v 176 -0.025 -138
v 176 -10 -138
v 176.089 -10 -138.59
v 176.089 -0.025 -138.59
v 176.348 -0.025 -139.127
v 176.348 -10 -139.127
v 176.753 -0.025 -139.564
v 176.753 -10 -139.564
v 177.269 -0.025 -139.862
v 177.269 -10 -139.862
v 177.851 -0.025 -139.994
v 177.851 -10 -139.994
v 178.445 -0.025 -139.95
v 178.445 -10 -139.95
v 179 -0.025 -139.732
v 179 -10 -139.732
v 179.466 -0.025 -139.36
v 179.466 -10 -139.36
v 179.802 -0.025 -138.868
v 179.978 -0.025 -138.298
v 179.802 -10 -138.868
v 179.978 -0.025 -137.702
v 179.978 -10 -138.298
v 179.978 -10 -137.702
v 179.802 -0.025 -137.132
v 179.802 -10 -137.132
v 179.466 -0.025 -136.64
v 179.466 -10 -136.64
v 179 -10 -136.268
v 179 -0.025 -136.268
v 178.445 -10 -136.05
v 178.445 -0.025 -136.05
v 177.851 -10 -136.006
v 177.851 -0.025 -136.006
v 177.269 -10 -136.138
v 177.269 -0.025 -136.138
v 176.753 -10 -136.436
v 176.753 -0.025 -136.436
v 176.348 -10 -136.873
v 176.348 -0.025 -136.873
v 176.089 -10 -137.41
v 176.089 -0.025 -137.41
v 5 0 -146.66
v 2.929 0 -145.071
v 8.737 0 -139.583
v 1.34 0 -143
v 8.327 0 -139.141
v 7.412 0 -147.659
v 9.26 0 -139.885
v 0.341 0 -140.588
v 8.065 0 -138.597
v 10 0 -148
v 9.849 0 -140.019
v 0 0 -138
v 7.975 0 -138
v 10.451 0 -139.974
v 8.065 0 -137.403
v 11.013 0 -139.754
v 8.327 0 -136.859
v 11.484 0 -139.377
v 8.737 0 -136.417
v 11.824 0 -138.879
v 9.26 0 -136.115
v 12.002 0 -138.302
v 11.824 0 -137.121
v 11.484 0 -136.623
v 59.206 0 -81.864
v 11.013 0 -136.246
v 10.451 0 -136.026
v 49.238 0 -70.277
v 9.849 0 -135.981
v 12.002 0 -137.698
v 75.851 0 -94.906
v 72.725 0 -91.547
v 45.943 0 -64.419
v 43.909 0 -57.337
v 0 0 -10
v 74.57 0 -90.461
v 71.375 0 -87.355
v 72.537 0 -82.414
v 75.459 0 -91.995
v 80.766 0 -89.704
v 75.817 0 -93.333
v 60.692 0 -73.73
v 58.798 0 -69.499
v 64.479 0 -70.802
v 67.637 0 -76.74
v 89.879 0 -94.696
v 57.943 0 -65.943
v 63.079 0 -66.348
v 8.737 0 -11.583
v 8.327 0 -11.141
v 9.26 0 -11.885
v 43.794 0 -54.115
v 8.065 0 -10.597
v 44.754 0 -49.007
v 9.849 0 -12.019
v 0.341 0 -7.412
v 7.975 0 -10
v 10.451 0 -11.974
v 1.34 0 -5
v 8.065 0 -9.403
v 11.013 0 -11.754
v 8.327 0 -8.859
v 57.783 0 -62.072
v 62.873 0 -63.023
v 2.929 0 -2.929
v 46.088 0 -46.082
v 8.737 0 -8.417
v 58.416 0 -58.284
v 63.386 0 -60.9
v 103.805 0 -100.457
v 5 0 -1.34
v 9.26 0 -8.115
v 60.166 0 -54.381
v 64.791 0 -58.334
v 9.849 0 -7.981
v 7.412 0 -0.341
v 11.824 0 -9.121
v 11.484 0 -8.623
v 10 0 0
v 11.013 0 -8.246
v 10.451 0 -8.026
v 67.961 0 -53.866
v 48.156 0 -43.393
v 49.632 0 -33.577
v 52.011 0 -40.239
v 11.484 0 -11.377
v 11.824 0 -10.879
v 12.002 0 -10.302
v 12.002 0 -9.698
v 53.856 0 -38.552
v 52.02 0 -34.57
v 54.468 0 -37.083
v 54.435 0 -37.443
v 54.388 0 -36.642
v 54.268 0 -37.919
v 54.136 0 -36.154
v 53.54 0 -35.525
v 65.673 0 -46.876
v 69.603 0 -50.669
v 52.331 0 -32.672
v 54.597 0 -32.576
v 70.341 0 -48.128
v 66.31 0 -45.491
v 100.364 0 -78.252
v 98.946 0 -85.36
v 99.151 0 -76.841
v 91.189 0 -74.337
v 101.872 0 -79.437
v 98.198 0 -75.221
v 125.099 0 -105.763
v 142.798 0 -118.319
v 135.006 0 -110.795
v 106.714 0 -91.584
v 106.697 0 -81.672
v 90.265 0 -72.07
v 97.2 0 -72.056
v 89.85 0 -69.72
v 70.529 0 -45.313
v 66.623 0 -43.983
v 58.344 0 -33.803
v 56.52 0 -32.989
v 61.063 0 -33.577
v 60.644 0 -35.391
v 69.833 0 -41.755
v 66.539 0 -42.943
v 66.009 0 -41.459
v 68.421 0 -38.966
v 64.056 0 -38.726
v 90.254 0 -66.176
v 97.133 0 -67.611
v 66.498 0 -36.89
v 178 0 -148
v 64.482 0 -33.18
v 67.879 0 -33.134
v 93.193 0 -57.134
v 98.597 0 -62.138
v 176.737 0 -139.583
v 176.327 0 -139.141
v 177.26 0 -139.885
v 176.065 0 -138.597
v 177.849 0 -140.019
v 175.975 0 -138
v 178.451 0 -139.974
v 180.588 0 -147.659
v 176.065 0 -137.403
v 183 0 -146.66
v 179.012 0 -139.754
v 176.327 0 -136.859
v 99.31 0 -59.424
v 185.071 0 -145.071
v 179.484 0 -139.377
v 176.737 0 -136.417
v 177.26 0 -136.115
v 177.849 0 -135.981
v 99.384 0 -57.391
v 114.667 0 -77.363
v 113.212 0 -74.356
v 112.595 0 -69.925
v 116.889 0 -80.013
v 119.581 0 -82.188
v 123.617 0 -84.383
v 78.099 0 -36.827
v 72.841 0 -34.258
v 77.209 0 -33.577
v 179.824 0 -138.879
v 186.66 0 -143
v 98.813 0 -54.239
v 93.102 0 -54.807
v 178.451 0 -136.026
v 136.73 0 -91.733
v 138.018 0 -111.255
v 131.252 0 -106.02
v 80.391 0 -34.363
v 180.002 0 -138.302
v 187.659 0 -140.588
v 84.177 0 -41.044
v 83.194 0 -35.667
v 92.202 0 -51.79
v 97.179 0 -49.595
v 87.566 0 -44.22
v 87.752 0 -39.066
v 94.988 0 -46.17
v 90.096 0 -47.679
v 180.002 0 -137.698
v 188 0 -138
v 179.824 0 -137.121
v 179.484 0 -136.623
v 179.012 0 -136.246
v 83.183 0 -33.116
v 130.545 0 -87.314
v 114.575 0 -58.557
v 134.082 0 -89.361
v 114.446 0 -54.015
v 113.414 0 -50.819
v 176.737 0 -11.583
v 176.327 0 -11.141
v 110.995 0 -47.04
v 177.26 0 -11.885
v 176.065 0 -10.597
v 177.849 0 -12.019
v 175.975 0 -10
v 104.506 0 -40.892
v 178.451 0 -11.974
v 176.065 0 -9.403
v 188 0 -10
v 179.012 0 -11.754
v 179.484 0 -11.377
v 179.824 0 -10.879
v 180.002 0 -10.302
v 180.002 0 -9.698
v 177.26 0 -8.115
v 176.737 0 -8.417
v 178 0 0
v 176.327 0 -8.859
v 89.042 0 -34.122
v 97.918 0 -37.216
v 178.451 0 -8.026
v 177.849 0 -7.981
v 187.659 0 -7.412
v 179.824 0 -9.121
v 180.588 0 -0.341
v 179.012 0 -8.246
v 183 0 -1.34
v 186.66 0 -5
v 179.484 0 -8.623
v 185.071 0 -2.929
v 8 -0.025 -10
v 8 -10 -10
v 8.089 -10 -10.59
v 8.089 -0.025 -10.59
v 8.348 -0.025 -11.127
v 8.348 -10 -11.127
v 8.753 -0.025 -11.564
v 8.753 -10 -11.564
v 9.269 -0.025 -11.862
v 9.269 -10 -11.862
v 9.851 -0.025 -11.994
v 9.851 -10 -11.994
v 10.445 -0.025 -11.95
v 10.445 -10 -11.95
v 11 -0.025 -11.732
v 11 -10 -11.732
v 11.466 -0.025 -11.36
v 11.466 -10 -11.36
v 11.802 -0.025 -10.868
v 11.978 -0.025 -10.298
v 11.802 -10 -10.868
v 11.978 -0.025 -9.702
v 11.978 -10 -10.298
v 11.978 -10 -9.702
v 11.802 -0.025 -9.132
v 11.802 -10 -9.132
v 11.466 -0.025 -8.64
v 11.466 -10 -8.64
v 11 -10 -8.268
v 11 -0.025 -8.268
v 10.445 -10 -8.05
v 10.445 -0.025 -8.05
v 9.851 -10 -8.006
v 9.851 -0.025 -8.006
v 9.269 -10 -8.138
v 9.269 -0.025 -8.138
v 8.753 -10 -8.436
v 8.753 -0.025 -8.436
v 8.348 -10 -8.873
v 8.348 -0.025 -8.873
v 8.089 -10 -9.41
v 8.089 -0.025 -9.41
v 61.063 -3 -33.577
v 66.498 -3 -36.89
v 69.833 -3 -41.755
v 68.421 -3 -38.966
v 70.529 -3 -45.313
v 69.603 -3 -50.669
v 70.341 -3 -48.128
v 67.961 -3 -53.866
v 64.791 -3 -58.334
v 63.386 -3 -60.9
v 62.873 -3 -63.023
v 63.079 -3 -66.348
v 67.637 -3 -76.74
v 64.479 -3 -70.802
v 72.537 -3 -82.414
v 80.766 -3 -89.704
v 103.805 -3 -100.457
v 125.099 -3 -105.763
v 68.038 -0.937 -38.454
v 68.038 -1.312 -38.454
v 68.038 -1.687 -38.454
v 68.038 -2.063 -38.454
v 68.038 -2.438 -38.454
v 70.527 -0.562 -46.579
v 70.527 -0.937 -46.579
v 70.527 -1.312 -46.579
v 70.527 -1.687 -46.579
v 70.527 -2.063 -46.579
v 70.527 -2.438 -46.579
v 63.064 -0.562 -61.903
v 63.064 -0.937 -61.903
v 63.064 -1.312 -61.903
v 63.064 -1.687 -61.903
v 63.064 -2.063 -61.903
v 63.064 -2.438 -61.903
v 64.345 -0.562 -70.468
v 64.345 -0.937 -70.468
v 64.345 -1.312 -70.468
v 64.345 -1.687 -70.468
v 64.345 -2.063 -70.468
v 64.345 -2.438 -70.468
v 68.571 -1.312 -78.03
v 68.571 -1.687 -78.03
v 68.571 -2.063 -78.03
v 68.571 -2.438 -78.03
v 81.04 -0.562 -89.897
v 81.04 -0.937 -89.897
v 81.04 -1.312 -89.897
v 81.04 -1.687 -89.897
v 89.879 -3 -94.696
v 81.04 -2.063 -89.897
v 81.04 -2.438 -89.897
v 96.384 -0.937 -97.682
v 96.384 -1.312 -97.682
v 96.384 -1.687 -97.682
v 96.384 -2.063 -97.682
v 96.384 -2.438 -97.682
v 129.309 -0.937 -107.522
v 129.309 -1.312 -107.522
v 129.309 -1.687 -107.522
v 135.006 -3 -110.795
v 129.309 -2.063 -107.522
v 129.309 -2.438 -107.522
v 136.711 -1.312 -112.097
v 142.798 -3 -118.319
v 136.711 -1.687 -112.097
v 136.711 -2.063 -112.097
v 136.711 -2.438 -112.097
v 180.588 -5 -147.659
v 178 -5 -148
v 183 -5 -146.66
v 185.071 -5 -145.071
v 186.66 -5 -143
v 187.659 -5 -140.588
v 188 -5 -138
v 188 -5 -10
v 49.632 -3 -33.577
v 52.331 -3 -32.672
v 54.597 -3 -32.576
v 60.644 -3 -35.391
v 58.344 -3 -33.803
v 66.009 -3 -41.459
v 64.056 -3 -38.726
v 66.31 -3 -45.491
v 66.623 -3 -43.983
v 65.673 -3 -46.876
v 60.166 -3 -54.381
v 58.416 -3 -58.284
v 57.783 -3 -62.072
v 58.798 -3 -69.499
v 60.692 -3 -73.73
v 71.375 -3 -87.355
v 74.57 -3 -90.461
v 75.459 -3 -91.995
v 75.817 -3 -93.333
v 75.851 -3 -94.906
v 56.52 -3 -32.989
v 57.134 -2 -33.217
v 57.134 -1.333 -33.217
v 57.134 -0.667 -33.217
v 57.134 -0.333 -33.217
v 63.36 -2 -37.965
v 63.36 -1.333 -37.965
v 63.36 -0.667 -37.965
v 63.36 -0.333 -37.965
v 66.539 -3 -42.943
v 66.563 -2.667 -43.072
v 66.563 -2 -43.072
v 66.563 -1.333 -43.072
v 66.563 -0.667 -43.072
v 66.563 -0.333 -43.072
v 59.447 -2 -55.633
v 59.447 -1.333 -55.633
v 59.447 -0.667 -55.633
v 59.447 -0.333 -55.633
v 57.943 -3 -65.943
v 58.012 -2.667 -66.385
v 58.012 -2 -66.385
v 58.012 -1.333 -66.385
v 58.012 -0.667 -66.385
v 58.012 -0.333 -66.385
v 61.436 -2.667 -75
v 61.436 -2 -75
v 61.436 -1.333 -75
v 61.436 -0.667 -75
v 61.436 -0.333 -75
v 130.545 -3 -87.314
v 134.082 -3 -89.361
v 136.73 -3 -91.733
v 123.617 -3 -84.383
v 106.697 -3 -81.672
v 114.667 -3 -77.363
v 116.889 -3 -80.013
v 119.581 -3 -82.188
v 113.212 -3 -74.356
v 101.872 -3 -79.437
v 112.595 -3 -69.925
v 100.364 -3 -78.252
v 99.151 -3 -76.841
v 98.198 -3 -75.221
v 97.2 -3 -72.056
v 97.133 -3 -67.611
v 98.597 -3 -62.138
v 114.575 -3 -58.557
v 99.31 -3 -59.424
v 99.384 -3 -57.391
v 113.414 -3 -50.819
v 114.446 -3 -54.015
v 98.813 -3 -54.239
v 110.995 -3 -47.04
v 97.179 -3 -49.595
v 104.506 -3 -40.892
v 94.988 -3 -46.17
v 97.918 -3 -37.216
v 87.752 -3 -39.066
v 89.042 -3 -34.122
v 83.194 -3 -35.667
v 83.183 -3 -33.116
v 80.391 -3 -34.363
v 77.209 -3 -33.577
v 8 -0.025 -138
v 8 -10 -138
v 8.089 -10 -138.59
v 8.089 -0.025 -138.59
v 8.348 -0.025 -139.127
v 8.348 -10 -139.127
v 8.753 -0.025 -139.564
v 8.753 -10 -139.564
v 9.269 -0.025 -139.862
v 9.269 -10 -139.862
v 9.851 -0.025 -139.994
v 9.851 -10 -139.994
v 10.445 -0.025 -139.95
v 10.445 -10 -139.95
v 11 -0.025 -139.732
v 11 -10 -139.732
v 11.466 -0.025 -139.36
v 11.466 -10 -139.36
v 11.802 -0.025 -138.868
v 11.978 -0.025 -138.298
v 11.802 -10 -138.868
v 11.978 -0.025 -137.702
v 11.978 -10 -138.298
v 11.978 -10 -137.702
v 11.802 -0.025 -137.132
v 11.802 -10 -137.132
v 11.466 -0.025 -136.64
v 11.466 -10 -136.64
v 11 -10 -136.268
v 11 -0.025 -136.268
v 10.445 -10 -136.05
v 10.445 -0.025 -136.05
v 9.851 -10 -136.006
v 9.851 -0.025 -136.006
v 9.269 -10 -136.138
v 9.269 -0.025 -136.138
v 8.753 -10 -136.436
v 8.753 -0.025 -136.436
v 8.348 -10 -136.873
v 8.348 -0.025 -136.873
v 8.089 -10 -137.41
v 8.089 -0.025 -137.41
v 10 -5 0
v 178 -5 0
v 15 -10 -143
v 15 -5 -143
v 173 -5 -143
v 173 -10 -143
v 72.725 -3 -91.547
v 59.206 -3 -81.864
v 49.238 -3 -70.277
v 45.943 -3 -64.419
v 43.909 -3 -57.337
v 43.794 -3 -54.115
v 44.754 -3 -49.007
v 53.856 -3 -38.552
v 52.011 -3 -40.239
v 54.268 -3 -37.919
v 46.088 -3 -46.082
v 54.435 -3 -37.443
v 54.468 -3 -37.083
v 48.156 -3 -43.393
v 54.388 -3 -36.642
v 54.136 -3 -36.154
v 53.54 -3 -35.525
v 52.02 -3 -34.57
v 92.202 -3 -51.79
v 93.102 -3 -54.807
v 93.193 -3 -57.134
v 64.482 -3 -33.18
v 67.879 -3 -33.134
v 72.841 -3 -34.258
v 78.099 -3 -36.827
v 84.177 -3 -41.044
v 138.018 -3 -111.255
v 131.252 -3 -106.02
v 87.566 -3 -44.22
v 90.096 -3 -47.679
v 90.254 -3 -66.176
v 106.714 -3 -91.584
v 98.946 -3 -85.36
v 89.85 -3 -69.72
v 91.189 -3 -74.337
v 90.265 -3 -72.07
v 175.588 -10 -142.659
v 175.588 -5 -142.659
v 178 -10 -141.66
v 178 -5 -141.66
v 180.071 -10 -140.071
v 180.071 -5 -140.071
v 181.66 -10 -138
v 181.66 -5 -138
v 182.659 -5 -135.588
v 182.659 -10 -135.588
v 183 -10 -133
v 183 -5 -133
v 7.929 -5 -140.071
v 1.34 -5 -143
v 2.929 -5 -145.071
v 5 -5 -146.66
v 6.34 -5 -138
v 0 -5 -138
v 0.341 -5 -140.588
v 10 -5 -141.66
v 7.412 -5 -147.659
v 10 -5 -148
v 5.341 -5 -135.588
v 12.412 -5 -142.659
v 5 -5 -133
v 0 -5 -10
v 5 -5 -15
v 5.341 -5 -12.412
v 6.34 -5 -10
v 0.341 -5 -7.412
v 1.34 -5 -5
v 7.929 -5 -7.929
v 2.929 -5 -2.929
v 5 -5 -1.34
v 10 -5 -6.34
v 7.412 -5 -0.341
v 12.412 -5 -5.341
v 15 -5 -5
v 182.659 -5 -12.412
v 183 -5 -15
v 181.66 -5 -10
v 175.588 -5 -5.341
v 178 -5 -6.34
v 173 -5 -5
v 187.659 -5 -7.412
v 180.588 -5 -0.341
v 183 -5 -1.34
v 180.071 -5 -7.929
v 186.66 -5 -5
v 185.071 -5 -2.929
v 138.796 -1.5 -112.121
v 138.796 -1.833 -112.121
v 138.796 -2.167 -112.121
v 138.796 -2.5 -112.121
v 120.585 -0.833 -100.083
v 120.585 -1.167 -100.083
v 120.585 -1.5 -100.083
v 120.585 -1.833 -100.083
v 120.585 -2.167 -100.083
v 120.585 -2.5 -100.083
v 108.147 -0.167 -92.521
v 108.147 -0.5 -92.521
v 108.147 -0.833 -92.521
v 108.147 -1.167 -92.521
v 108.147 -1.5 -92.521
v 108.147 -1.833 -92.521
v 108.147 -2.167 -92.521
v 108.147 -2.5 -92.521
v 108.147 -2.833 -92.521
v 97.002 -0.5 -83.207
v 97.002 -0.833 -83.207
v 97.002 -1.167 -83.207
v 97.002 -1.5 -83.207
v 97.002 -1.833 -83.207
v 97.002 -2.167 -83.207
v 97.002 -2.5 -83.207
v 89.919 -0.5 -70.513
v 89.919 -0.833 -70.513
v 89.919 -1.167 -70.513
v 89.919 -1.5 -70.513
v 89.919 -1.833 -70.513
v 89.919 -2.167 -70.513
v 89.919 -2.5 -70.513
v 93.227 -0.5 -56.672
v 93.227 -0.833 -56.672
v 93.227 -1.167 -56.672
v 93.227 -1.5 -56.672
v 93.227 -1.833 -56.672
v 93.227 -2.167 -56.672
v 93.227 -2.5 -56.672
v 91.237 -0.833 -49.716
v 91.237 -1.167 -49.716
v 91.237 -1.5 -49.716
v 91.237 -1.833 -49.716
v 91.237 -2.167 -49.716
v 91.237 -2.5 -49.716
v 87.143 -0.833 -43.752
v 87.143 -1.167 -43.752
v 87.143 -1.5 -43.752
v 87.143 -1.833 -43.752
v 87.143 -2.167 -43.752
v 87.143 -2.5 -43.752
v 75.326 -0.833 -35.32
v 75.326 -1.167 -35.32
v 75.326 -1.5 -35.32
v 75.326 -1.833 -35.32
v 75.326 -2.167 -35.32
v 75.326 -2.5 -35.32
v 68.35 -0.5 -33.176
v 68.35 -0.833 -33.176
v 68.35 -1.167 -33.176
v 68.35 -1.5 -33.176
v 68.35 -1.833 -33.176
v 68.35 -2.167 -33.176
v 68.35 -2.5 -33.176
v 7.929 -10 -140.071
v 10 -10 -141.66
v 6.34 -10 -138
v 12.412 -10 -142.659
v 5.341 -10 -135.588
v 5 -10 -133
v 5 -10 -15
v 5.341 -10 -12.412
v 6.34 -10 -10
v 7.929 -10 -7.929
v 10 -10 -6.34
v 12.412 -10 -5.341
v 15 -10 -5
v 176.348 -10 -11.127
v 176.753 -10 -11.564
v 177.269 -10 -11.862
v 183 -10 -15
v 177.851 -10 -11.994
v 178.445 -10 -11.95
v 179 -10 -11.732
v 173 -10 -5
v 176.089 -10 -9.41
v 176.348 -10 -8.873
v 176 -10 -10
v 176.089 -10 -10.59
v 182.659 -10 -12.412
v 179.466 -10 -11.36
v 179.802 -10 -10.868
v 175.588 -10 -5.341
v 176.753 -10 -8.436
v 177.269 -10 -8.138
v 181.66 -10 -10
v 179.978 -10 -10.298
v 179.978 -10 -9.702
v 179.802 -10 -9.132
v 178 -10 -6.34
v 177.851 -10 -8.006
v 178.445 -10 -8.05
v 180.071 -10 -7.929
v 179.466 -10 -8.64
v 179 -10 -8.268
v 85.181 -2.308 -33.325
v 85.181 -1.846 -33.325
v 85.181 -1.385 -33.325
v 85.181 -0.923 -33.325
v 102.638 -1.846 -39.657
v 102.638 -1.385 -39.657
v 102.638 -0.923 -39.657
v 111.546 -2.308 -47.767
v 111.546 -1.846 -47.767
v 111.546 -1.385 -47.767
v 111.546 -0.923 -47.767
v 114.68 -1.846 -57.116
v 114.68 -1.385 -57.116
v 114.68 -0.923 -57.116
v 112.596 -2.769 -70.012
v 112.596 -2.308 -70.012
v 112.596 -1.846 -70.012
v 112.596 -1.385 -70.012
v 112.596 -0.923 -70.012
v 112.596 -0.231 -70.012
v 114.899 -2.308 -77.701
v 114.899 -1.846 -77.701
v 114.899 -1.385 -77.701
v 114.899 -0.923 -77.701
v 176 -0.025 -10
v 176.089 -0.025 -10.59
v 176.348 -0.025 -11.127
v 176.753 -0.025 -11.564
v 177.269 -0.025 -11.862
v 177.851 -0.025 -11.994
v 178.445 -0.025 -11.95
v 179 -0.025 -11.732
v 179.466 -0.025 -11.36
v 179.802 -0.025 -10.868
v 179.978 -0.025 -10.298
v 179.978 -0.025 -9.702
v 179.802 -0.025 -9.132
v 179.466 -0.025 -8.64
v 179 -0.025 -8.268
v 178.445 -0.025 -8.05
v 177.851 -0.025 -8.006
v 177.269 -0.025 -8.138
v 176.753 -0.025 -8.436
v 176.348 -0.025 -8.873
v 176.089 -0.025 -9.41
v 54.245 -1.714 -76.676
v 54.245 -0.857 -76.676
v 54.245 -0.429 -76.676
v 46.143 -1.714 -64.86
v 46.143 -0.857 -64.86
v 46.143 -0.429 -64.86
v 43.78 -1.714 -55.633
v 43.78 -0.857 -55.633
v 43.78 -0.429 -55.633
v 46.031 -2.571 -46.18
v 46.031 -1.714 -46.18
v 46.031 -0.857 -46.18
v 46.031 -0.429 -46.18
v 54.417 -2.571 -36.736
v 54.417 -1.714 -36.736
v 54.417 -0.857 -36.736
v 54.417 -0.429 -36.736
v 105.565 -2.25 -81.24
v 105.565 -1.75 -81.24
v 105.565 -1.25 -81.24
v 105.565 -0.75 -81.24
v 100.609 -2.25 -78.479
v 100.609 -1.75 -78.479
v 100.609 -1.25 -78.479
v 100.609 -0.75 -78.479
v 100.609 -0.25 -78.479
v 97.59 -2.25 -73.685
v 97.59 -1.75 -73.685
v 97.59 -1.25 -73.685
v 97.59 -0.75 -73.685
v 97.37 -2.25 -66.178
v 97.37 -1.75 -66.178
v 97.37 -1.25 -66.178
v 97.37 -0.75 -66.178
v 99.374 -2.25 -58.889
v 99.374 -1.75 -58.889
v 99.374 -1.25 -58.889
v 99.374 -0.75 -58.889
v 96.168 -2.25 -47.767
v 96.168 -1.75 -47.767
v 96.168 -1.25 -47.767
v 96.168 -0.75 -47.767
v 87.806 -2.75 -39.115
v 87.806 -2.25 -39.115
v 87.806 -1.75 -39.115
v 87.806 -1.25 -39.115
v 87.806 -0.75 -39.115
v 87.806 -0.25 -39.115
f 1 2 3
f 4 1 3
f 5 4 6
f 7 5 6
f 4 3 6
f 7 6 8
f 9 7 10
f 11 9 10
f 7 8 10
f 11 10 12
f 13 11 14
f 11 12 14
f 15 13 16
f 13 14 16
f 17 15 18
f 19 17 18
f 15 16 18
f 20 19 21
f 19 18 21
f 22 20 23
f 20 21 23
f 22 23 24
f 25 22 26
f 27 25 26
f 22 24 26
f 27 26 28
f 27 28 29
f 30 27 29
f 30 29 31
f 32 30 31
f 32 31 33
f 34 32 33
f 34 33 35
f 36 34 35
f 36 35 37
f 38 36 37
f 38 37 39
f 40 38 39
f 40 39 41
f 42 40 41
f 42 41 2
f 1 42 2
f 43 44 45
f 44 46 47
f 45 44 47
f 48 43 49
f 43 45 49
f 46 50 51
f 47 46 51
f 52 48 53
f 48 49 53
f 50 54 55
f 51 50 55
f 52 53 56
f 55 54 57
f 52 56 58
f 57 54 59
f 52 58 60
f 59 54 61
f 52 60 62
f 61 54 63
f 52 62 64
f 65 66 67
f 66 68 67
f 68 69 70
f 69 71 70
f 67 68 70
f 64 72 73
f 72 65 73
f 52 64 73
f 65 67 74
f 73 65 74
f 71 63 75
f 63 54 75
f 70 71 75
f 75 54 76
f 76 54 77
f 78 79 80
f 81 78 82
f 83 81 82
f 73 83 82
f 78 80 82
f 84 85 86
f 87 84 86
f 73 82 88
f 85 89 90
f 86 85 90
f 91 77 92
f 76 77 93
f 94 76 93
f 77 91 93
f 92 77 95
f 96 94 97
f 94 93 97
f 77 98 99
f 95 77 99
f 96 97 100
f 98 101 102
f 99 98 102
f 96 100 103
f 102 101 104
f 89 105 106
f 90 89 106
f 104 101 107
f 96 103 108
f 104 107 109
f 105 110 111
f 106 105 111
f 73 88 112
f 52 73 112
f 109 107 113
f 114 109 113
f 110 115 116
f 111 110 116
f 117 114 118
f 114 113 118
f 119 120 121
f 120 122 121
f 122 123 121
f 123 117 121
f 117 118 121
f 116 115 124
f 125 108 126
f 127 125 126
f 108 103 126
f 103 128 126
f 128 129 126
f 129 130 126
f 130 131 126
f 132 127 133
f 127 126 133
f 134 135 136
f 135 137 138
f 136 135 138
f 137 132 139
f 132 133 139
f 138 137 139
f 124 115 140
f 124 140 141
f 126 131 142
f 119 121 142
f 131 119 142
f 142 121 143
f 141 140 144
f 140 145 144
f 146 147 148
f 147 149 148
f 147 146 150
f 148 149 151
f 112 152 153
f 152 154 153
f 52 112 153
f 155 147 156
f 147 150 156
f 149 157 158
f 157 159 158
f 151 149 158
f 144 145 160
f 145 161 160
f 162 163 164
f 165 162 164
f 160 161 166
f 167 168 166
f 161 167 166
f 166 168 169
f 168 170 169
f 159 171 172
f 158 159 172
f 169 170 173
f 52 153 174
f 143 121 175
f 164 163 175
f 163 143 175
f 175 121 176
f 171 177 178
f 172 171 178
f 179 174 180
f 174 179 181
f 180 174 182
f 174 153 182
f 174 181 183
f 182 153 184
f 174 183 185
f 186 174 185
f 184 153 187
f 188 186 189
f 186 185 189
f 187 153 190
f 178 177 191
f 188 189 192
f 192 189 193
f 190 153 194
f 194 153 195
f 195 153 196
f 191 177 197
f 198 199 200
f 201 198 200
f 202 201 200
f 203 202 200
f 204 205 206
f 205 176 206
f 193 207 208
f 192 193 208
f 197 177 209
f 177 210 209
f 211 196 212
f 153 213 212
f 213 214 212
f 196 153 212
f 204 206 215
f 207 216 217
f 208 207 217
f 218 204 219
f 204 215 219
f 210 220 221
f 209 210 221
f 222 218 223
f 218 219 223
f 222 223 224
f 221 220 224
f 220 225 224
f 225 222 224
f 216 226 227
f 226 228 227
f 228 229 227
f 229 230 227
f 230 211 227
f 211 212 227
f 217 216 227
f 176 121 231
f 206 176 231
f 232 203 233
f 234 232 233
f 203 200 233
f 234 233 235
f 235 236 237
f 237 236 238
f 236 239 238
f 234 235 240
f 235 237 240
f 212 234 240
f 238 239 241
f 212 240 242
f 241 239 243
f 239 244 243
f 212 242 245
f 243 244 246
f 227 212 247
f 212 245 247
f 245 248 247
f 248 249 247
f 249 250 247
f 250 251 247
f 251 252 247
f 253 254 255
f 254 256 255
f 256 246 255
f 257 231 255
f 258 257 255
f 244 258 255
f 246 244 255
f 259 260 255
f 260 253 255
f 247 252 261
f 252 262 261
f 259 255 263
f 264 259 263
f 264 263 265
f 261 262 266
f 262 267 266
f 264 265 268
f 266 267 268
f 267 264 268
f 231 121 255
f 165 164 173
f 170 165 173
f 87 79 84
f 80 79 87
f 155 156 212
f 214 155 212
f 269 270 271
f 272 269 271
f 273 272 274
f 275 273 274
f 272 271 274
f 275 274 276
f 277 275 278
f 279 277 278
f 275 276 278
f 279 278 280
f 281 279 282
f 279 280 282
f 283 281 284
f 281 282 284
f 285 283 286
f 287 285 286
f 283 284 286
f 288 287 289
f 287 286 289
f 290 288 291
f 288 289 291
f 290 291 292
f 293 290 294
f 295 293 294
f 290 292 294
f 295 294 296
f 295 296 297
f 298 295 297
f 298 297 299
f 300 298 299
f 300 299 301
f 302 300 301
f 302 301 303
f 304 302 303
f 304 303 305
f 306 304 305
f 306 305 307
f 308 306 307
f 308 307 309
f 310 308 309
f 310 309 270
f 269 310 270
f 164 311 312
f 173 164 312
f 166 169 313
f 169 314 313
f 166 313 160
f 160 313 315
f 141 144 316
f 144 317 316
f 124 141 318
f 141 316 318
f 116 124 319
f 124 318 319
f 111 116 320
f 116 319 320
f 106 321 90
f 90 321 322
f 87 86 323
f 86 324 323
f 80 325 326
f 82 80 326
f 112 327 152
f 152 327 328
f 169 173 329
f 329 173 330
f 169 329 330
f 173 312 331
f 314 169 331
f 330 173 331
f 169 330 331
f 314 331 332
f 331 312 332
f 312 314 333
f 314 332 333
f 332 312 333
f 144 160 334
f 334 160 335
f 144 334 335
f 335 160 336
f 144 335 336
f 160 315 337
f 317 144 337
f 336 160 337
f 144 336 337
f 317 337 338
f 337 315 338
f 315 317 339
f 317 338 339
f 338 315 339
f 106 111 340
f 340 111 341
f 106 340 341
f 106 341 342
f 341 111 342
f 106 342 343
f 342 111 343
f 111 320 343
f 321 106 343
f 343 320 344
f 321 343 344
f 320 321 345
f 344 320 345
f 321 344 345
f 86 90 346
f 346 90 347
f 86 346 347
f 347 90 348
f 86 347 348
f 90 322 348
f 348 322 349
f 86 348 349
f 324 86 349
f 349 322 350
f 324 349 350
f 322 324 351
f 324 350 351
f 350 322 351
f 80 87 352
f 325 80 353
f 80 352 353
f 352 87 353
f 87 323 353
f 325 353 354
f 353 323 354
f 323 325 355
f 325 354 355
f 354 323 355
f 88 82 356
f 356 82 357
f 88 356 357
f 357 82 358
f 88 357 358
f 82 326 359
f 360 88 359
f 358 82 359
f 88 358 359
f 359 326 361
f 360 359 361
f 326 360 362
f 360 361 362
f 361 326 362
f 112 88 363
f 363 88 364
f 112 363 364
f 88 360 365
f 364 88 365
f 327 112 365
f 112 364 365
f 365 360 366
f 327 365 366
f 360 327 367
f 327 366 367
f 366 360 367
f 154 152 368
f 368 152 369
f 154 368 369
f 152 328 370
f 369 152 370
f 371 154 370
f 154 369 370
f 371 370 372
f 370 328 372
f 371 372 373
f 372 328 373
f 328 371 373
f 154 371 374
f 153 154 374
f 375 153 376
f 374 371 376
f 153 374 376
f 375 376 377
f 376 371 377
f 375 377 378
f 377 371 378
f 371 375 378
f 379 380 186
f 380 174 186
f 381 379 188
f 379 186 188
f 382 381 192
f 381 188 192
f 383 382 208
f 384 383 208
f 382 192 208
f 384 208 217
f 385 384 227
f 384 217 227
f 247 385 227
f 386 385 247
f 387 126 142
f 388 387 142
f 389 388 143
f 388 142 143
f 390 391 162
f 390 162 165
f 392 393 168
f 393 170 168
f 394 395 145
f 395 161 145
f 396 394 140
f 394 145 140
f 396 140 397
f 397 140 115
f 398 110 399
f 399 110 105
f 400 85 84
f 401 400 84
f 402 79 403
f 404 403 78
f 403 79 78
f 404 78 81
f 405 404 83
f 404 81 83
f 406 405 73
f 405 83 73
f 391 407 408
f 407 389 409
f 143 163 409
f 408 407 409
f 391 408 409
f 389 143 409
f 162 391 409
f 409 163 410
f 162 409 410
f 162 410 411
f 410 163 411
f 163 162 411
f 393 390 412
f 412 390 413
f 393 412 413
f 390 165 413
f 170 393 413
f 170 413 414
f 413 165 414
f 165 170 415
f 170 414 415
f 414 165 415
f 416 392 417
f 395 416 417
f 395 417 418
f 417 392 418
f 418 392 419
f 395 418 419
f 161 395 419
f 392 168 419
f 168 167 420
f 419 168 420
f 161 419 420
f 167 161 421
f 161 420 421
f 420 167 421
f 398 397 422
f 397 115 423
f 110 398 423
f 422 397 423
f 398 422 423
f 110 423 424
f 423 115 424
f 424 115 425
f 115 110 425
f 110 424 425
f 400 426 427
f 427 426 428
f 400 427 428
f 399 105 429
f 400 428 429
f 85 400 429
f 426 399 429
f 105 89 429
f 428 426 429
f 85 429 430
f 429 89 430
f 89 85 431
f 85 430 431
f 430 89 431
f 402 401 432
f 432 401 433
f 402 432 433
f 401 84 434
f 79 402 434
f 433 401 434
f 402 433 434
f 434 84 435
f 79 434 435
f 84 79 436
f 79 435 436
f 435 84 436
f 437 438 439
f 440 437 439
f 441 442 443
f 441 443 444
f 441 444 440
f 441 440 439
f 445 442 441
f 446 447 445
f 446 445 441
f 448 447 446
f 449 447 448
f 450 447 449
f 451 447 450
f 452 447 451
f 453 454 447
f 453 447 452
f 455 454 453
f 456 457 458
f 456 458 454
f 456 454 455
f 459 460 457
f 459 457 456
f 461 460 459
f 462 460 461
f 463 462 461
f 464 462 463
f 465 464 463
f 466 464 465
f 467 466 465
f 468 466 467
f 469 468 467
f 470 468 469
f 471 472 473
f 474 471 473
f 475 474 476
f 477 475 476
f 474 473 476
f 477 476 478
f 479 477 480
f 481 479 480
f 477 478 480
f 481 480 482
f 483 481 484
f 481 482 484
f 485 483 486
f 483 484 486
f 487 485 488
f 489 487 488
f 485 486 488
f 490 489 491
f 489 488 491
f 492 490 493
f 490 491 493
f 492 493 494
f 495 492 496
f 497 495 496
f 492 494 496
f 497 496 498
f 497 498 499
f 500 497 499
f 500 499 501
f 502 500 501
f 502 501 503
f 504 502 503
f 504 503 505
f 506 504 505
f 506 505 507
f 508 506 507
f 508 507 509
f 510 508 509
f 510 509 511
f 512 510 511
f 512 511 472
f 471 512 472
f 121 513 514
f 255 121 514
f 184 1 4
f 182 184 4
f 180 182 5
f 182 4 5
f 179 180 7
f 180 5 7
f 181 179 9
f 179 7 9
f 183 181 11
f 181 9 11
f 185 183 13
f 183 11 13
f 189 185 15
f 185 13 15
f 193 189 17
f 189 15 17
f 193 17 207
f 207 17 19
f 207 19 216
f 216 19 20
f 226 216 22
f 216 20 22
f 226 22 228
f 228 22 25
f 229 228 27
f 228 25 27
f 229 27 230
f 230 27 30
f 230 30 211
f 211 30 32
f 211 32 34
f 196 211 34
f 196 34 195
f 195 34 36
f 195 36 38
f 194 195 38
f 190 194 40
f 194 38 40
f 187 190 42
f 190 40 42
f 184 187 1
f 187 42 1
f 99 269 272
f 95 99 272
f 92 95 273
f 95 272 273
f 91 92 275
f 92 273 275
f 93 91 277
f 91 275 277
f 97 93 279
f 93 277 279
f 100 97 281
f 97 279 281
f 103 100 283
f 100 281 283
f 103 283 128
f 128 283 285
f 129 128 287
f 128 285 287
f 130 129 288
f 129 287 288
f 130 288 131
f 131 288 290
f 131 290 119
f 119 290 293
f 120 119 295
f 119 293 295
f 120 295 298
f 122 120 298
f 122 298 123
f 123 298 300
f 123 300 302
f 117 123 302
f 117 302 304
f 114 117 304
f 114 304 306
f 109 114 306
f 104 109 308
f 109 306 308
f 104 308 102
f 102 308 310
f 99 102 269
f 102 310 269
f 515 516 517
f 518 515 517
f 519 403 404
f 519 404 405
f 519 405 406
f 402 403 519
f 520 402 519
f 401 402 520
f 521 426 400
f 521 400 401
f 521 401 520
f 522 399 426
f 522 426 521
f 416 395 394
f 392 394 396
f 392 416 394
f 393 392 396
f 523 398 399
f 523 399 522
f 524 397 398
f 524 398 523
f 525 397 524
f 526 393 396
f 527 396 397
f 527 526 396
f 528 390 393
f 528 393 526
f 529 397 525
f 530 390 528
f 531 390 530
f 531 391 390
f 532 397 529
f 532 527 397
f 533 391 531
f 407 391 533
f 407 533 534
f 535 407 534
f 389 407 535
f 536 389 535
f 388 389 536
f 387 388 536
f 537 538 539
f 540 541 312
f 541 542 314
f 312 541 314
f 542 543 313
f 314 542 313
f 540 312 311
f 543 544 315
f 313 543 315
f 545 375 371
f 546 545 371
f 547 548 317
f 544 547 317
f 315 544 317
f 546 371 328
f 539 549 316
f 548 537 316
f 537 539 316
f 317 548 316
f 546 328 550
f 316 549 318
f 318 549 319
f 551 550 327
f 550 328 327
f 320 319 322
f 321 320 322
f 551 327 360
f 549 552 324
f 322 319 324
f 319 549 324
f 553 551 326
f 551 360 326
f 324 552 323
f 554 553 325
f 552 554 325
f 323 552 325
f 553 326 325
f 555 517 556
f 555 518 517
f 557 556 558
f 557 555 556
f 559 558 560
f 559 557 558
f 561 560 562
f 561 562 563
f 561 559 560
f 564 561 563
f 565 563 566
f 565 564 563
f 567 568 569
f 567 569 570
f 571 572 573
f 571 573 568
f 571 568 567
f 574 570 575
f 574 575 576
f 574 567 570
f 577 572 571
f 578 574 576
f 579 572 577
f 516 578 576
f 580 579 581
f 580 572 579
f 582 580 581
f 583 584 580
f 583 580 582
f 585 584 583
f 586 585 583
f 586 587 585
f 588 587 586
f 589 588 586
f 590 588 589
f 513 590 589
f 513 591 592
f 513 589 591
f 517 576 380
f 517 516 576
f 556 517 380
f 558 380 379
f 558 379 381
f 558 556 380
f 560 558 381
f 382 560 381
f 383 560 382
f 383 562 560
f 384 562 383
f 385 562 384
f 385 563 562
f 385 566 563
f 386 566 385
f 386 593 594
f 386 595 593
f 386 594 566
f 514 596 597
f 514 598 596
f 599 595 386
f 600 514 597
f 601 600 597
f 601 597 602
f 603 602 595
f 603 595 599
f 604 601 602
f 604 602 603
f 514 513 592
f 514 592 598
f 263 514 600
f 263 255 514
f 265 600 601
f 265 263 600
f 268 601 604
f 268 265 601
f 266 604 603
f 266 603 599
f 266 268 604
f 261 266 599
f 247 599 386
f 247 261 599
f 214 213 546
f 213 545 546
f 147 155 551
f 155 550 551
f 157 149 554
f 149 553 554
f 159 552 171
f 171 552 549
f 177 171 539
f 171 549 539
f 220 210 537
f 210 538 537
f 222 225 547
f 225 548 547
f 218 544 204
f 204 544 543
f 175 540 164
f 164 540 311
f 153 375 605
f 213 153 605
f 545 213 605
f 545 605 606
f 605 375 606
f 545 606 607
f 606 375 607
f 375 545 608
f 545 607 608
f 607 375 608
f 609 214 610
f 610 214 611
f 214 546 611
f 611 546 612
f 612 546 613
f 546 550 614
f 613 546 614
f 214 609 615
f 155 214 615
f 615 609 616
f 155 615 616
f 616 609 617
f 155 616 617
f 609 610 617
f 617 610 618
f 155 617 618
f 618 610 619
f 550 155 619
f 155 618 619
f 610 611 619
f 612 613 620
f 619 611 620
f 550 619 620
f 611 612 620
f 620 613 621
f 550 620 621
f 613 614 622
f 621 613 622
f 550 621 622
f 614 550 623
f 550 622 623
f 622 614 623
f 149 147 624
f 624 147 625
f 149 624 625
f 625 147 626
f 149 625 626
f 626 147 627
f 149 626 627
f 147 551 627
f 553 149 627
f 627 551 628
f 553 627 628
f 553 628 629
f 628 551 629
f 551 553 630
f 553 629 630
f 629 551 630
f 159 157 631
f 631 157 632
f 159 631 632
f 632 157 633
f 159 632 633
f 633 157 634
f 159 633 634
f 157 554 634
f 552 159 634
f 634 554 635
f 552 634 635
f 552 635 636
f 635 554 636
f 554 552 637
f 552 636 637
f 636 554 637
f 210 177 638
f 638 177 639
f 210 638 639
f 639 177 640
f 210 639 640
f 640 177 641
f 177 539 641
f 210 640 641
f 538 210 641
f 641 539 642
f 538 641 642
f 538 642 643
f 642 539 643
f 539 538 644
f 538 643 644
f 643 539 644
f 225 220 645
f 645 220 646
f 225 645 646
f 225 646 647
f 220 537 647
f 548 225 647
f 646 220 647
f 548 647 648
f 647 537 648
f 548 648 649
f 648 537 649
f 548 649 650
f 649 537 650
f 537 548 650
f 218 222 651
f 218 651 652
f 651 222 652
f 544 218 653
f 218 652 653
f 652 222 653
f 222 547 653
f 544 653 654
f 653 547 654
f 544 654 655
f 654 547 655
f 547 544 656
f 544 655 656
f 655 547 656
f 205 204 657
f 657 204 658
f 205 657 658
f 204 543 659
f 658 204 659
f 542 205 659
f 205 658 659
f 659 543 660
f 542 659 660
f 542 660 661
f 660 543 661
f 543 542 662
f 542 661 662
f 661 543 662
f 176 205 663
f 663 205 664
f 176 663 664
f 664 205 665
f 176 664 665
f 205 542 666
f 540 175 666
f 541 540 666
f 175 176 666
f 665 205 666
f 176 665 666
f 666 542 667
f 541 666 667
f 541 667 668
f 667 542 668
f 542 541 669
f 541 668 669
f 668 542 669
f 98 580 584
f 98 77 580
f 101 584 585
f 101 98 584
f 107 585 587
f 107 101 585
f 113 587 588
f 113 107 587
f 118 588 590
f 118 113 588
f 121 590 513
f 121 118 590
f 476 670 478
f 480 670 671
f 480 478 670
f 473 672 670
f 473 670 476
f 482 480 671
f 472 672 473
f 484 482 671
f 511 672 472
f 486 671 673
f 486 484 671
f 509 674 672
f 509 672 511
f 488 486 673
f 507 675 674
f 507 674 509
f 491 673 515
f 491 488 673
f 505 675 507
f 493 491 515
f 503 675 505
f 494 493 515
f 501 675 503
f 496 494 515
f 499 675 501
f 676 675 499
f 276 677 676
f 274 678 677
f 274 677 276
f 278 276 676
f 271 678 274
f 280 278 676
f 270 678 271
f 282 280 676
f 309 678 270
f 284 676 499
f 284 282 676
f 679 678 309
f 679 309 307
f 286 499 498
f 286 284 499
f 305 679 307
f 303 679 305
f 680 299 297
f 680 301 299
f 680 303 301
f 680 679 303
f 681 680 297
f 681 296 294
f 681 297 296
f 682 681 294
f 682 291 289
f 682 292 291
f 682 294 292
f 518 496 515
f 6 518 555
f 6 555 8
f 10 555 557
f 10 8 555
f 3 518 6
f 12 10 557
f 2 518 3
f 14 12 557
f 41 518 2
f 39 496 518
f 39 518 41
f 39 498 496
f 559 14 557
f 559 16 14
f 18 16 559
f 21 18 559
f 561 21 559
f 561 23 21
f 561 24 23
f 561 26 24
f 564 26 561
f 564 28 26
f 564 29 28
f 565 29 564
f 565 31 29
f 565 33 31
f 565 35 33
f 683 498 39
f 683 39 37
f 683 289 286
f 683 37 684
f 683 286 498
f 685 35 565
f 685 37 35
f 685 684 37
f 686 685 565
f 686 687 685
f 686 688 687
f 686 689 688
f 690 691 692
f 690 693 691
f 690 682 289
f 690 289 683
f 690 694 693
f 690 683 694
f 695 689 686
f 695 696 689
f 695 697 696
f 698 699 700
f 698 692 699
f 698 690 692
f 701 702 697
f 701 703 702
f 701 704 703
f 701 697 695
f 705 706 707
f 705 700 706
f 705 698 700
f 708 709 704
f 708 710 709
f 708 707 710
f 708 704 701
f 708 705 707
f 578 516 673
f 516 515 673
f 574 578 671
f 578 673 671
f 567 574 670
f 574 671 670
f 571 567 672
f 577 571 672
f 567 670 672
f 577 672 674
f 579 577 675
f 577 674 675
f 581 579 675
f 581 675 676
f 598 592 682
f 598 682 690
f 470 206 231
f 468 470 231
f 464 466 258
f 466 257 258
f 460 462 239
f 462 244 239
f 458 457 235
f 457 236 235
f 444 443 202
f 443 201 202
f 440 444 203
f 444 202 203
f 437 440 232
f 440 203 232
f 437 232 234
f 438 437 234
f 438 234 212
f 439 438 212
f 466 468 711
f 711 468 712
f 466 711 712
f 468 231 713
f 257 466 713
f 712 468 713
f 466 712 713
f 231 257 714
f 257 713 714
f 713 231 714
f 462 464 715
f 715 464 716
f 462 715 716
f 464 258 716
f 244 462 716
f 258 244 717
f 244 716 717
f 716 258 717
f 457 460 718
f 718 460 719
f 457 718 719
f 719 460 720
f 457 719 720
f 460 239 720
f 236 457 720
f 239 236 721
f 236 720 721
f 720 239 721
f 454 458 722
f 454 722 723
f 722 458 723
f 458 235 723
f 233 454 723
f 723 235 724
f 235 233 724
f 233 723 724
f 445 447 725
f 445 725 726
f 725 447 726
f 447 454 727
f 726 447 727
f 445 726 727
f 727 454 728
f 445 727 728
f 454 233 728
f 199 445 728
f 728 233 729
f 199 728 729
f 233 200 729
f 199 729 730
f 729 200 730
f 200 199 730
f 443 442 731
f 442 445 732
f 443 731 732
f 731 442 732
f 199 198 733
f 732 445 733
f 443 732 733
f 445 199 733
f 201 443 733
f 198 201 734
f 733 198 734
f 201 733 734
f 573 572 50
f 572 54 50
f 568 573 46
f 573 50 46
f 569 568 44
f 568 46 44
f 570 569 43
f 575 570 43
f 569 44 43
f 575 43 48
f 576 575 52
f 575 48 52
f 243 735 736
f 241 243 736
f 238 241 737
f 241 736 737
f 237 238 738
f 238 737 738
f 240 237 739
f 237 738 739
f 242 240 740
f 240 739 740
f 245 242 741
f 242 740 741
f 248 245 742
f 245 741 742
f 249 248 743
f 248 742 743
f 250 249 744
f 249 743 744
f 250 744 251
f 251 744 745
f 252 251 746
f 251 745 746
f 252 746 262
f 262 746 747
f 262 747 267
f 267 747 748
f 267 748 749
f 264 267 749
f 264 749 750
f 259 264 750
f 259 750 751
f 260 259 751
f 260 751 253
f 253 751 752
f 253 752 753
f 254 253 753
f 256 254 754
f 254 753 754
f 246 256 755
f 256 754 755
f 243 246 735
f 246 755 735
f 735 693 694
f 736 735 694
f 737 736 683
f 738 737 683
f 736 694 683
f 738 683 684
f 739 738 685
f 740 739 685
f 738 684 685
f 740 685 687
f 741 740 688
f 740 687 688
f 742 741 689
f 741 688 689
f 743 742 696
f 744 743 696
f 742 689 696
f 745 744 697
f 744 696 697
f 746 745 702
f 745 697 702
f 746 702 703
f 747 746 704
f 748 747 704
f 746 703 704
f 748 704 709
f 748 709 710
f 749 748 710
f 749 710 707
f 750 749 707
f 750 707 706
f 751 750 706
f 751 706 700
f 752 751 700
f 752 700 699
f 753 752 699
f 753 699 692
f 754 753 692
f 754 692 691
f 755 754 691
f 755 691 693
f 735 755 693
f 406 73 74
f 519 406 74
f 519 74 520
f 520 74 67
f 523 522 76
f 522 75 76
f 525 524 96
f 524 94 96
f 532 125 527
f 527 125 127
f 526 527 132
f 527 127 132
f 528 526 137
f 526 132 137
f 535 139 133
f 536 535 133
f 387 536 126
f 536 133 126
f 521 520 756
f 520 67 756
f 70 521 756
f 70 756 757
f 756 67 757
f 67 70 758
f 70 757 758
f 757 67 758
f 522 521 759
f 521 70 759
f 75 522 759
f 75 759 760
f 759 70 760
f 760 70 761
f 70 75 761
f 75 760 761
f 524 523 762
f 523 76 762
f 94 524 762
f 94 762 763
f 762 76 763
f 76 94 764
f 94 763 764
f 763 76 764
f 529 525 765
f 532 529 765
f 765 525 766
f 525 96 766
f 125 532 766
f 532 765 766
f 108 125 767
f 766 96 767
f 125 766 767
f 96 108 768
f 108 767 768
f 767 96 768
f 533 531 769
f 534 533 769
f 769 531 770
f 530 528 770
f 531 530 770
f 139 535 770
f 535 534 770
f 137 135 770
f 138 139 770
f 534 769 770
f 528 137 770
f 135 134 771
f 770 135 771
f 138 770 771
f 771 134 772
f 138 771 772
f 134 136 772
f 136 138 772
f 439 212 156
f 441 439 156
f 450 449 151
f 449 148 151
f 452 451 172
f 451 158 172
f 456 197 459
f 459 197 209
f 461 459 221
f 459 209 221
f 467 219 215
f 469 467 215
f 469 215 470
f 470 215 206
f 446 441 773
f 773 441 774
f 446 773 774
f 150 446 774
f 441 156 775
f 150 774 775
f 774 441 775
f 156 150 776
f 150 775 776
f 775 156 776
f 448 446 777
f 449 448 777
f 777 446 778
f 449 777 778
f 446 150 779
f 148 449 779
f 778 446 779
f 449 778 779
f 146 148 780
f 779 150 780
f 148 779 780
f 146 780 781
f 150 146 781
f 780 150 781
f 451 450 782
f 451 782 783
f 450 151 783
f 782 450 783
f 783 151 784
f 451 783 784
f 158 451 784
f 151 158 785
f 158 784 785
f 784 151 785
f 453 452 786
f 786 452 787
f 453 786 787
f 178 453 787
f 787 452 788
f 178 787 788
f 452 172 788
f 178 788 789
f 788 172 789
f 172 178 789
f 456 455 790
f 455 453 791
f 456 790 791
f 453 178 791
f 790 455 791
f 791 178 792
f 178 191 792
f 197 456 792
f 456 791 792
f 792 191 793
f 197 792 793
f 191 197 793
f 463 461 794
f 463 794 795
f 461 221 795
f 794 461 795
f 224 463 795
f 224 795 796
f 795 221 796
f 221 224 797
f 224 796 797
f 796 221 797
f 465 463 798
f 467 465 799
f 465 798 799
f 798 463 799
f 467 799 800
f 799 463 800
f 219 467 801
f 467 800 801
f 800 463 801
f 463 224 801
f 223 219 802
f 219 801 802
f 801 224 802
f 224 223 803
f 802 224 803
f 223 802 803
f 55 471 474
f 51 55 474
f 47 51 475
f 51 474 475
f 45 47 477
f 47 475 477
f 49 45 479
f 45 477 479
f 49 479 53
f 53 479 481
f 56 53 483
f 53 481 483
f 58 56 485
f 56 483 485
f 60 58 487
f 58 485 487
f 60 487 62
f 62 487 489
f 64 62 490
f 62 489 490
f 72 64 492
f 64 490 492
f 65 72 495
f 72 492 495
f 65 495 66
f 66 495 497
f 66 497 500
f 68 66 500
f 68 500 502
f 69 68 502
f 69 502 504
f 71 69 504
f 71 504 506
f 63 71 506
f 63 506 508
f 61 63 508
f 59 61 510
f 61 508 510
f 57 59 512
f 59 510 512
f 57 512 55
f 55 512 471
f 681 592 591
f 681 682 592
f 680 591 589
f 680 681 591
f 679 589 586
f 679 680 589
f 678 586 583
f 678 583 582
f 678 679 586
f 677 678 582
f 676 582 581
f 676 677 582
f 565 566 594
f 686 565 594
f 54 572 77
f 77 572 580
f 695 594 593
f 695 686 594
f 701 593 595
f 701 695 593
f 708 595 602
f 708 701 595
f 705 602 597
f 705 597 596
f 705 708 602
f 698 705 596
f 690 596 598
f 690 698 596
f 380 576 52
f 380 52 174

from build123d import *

# Parameters (mm, degrees)
ESBO_O1_W                  = 188
ESBO_O1_H                  = 148
RESSALTO_EXTRUS_O1_DEPTH   = 5
ESBO_O2_W                  = 178
ESBO_O2_H                  = 138
RESSALTO_EXTRUS_O2_DEPTH   = 5
CORTE_EXTRUS_O1_DEPTH      = 3
CORTE_EXTRUS_O2_DEPTH      = 3
CORTE_EXTRUS_O3_START      = 5.999999
CORTE_EXTRUS_O3_DEPTH      = 3.000001
FURO_DE_DI_METRO_4_0_4_1_D = 4
CHANFRO1_SIZE              = 0.025
FILETE1_R                  = 10


with BuildPart() as part:
    # Esboço1 → Ressalto-extrusão1 (new body)
    with BuildSketch(Plane.XZ.offset(5)):
        with Locations((94, -74)):
            Rectangle(ESBO_O1_W, ESBO_O1_H)
    extrude(amount=-RESSALTO_EXTRUS_O1_DEPTH)

    # Esboço2 → Ressalto-extrusão2 (add)
    with BuildSketch(Plane.XZ.offset(5)):
        with Locations((94, -74)):
            Rectangle(ESBO_O2_W, ESBO_O2_H)
    extrude(amount=RESSALTO_EXTRUS_O2_DEPTH)

    # Esboço3 → Corte-extrusão1 (cut)
    with BuildSketch(Plane(origin=(0, 0, 0), x_dir=(-1, 0, 0), z_dir=(0, 1, 0))):
        with BuildLine():
            add(Edge.make_bspline(
                [(-75.851271047, -94.905977801), (-72.853529778, -90.461908235), (-63.518965975, -86.573475907), (-53.388238374, -76.062354108), (-46.202294461, -66.650840181), (-42.933896498, -55.687444915), (-44.842557243, -47.101668287), (-50.660608799, -40.290662898), (-58.64177807, -36.769977477), (-49.631630274, -33.576775134)],
                knots=[0, 0, 0, 0, 0.22173064, 0.36107088, 0.538533699, 0.656521569, 0.776881579, 0.841136845, 1, 1, 1, 1], degree=3))
            add(Edge.make_bspline(
                [(-49.631630274, -33.576775134), (-55.193208686, -30.863794332), (-61.383930126, -35.182265377), (-67.85694371, -43.262736471), (-64.028195245, -49.870932971), (-58.196053752, -55.563823422), (-57.030485514, -66.133339409), (-61.210041506, -75.49236965), (-66.547457609, -81.863728313), (-71.776148718, -88.295991451), (-76.196365931, -90.955926743), (-75.851271047, -94.905977801)],
                knots=[0, 0, 0, 0, 0.190021042, 0.273179635, 0.335508524, 0.444529759, 0.578502017, 0.692991247, 0.817663949, 0.885290163, 1, 1, 1, 1], degree=3))
        make_face()
    extrude(amount=-CORTE_EXTRUS_O1_DEPTH, mode=Mode.SUBTRACT)

    # Esboço4 → Corte-extrusão2 (cut)
    with BuildSketch(Plane(origin=(0, 0, 0), x_dir=(-1, 0, 0), z_dir=(0, 1, 0))):
        with BuildLine():
            add(Edge.make_bspline(
                [(-136.729671692, -91.732742251), (-130.54797809, -89.41900582), (-121.995778776, -86.285522027), (-111.41766579, -83.310038148), (-105.490059757, -81.315624718), (-100.209565482, -78.910124849), (-97.166418624, -73.823248608), (-96.830332763, -68.894438878), (-97.755261853, -63.942155002), (-99.978332244, -59.259888431), (-98.67939373, -53.240415216), (-96.439595754, -47.170244468), (-88.797320177, -40.170304439), (-83.294970154, -34.443536621), (-77.209296676, -33.576775134)],
                knots=[0, 0, 0, 0, 0.208186758, 0.287593338, 0.34598667, 0.40677389, 0.465273363, 0.522640342, 0.558971213, 0.624214432, 0.679618529, 0.747020385, 0.825667459, 1, 1, 1, 1], degree=3))
            add(Edge.make_bspline(
                [(-77.209296676, -33.576775134), (-82.585116536, -32.31898283), (-91.352658464, -34.428249196), (-101.398867055, -38.531561412), (-107.530164378, -43.072555909), (-111.352655789, -47.200724364), (-114.247792048, -51.923301271), (-114.938348234, -56.800502578), (-114.151500445, -61.41688971), (-112.866253897, -65.597847037), (-112.417371236, -70.210515308), (-113.007237755, -74.7648398), (-115.889578157, -79.468708801), (-123.694808489, -85.699371169), (-132.443581982, -86.909139375), (-136.729671692, -91.732742251)],
                knots=[0, 0, 0, 0, 0.166386519, 0.27706617, 0.336739741, 0.403034311, 0.451940723, 0.507330924, 0.55214553, 0.597486466, 0.643567118, 0.69622128, 0.737301428, 0.812802954, 1, 1, 1, 1], degree=3))
        make_face()
    extrude(amount=-CORTE_EXTRUS_O2_DEPTH, mode=Mode.SUBTRACT)

    # Esboço5 → Corte-extrusão3 (cut)
    with BuildSketch(Plane(origin=(0, -8.999999416, 0), x_dir=(1, 0, 0), z_dir=(0, 1, 0)).offset(CORTE_EXTRUS_O3_START)):
        with BuildLine():
            add(Edge.make_bspline(
                [(142.797722166, 118.318760004), (141.55737102, 116.103559652), (139.132967552, 111.773705613), (133.282849534, 107.12676109), (127.016660755, 103.503815432), (120.55072949, 100.15218557), (114.310505573, 96.394806529), (108.124307846, 92.559675632), (102.074067108, 88.493554986), (96.782850849, 83.359171175), (92.821862337, 77.326939474), (88.983167693, 70.724875086), (90.844934858, 63.393230233), (94.274180002, 56.764300619), (91.430089418, 49.523425312), (87.454006301, 43.492143706), (81.590473794, 38.993211516), (75.491955375, 35.081795496), (68.398146179, 32.600302514), (63.514772267, 33.250351232), (61.06257149, 33.576775134)],
                knots=[0, 0, 0, 0, 0.057636738, 0.112657377, 0.168143283, 0.223818375, 0.279375213, 0.335006206, 0.390601607, 0.446300447, 0.501841326, 0.557866933, 0.6118473, 0.666809528, 0.721725073, 0.777322344, 0.83294114, 0.888513668, 0.944016806, 1, 1, 1, 1], degree=3))
            add(Edge.make_bspline(
                [(61.06257149, 33.576775134), (63.70678031, 34.93587517), (68.92788595, 37.619477465), (71.570599658, 46.865300373), (67.920103528, 54.817354375), (61.572954516, 61.557692954), (64.081590616, 70.781691203), (68.213684572, 78.263821244), (74.480339952, 84.318584584), (80.786490273, 90.235655158), (88.573237157, 94.088447273), (96.325623659, 97.780889538), (104.403628291, 100.866438131), (112.828877079, 102.690441809), (121.3012891, 104.295268028), (129.403001338, 107.285492464), (136.990487774, 111.722084003), (140.847014635, 116.10287122), (142.797722166, 118.318760004)],
                knots=[0, 0, 0, 0, 0.062548912, 0.123505555, 0.186160536, 0.247751486, 0.31095589, 0.373508024, 0.436067339, 0.498650764, 0.561041918, 0.62364606, 0.686120194, 0.748656144, 0.811154446, 0.873631853, 0.936080493, 1, 1, 1, 1], degree=3))
        make_face()
    extrude(amount=CORTE_EXTRUS_O3_DEPTH, mode=Mode.SUBTRACT)

    # Furo de diâmetro Ø4.0 (4)1 (through all)
    with Locations(Plane(origin=(0, 0, 0), x_dir=(1, 0, 0), z_dir=(0, 1, 0))):
        with Locations((178, 138), (178, 10), (10, 10), (10, 138)):
            Hole(FURO_DE_DI_METRO_4_0_4_1_D / 2)

    # Chanfro1
    chanfro1_edges = [part.edges().sort_by_distance(p)[0] for p in [
        (12, 0, -138),
        (12, 0, -10),
        (180, 0, -10),
        (180, 0, -138),
    ]]
    chamfer(chanfro1_edges, length=CHANFRO1_SIZE)

    # Filete1
    filete1_edges = [part.edges().sort_by_distance(p)[0] for p in [
        (5, -7.5, -5),
        (5, -7.5, -143),
        (183, -7.5, -143),
        (183, -7.5, -5),
        (0, -2.5, 0),
        (188, -2.5, 0),
        (188, -2.5, -148),
        (0, -2.5, -148),
    ]]
    fillet(filete1_edges, radius=FILETE1_R)


solid = part.part
